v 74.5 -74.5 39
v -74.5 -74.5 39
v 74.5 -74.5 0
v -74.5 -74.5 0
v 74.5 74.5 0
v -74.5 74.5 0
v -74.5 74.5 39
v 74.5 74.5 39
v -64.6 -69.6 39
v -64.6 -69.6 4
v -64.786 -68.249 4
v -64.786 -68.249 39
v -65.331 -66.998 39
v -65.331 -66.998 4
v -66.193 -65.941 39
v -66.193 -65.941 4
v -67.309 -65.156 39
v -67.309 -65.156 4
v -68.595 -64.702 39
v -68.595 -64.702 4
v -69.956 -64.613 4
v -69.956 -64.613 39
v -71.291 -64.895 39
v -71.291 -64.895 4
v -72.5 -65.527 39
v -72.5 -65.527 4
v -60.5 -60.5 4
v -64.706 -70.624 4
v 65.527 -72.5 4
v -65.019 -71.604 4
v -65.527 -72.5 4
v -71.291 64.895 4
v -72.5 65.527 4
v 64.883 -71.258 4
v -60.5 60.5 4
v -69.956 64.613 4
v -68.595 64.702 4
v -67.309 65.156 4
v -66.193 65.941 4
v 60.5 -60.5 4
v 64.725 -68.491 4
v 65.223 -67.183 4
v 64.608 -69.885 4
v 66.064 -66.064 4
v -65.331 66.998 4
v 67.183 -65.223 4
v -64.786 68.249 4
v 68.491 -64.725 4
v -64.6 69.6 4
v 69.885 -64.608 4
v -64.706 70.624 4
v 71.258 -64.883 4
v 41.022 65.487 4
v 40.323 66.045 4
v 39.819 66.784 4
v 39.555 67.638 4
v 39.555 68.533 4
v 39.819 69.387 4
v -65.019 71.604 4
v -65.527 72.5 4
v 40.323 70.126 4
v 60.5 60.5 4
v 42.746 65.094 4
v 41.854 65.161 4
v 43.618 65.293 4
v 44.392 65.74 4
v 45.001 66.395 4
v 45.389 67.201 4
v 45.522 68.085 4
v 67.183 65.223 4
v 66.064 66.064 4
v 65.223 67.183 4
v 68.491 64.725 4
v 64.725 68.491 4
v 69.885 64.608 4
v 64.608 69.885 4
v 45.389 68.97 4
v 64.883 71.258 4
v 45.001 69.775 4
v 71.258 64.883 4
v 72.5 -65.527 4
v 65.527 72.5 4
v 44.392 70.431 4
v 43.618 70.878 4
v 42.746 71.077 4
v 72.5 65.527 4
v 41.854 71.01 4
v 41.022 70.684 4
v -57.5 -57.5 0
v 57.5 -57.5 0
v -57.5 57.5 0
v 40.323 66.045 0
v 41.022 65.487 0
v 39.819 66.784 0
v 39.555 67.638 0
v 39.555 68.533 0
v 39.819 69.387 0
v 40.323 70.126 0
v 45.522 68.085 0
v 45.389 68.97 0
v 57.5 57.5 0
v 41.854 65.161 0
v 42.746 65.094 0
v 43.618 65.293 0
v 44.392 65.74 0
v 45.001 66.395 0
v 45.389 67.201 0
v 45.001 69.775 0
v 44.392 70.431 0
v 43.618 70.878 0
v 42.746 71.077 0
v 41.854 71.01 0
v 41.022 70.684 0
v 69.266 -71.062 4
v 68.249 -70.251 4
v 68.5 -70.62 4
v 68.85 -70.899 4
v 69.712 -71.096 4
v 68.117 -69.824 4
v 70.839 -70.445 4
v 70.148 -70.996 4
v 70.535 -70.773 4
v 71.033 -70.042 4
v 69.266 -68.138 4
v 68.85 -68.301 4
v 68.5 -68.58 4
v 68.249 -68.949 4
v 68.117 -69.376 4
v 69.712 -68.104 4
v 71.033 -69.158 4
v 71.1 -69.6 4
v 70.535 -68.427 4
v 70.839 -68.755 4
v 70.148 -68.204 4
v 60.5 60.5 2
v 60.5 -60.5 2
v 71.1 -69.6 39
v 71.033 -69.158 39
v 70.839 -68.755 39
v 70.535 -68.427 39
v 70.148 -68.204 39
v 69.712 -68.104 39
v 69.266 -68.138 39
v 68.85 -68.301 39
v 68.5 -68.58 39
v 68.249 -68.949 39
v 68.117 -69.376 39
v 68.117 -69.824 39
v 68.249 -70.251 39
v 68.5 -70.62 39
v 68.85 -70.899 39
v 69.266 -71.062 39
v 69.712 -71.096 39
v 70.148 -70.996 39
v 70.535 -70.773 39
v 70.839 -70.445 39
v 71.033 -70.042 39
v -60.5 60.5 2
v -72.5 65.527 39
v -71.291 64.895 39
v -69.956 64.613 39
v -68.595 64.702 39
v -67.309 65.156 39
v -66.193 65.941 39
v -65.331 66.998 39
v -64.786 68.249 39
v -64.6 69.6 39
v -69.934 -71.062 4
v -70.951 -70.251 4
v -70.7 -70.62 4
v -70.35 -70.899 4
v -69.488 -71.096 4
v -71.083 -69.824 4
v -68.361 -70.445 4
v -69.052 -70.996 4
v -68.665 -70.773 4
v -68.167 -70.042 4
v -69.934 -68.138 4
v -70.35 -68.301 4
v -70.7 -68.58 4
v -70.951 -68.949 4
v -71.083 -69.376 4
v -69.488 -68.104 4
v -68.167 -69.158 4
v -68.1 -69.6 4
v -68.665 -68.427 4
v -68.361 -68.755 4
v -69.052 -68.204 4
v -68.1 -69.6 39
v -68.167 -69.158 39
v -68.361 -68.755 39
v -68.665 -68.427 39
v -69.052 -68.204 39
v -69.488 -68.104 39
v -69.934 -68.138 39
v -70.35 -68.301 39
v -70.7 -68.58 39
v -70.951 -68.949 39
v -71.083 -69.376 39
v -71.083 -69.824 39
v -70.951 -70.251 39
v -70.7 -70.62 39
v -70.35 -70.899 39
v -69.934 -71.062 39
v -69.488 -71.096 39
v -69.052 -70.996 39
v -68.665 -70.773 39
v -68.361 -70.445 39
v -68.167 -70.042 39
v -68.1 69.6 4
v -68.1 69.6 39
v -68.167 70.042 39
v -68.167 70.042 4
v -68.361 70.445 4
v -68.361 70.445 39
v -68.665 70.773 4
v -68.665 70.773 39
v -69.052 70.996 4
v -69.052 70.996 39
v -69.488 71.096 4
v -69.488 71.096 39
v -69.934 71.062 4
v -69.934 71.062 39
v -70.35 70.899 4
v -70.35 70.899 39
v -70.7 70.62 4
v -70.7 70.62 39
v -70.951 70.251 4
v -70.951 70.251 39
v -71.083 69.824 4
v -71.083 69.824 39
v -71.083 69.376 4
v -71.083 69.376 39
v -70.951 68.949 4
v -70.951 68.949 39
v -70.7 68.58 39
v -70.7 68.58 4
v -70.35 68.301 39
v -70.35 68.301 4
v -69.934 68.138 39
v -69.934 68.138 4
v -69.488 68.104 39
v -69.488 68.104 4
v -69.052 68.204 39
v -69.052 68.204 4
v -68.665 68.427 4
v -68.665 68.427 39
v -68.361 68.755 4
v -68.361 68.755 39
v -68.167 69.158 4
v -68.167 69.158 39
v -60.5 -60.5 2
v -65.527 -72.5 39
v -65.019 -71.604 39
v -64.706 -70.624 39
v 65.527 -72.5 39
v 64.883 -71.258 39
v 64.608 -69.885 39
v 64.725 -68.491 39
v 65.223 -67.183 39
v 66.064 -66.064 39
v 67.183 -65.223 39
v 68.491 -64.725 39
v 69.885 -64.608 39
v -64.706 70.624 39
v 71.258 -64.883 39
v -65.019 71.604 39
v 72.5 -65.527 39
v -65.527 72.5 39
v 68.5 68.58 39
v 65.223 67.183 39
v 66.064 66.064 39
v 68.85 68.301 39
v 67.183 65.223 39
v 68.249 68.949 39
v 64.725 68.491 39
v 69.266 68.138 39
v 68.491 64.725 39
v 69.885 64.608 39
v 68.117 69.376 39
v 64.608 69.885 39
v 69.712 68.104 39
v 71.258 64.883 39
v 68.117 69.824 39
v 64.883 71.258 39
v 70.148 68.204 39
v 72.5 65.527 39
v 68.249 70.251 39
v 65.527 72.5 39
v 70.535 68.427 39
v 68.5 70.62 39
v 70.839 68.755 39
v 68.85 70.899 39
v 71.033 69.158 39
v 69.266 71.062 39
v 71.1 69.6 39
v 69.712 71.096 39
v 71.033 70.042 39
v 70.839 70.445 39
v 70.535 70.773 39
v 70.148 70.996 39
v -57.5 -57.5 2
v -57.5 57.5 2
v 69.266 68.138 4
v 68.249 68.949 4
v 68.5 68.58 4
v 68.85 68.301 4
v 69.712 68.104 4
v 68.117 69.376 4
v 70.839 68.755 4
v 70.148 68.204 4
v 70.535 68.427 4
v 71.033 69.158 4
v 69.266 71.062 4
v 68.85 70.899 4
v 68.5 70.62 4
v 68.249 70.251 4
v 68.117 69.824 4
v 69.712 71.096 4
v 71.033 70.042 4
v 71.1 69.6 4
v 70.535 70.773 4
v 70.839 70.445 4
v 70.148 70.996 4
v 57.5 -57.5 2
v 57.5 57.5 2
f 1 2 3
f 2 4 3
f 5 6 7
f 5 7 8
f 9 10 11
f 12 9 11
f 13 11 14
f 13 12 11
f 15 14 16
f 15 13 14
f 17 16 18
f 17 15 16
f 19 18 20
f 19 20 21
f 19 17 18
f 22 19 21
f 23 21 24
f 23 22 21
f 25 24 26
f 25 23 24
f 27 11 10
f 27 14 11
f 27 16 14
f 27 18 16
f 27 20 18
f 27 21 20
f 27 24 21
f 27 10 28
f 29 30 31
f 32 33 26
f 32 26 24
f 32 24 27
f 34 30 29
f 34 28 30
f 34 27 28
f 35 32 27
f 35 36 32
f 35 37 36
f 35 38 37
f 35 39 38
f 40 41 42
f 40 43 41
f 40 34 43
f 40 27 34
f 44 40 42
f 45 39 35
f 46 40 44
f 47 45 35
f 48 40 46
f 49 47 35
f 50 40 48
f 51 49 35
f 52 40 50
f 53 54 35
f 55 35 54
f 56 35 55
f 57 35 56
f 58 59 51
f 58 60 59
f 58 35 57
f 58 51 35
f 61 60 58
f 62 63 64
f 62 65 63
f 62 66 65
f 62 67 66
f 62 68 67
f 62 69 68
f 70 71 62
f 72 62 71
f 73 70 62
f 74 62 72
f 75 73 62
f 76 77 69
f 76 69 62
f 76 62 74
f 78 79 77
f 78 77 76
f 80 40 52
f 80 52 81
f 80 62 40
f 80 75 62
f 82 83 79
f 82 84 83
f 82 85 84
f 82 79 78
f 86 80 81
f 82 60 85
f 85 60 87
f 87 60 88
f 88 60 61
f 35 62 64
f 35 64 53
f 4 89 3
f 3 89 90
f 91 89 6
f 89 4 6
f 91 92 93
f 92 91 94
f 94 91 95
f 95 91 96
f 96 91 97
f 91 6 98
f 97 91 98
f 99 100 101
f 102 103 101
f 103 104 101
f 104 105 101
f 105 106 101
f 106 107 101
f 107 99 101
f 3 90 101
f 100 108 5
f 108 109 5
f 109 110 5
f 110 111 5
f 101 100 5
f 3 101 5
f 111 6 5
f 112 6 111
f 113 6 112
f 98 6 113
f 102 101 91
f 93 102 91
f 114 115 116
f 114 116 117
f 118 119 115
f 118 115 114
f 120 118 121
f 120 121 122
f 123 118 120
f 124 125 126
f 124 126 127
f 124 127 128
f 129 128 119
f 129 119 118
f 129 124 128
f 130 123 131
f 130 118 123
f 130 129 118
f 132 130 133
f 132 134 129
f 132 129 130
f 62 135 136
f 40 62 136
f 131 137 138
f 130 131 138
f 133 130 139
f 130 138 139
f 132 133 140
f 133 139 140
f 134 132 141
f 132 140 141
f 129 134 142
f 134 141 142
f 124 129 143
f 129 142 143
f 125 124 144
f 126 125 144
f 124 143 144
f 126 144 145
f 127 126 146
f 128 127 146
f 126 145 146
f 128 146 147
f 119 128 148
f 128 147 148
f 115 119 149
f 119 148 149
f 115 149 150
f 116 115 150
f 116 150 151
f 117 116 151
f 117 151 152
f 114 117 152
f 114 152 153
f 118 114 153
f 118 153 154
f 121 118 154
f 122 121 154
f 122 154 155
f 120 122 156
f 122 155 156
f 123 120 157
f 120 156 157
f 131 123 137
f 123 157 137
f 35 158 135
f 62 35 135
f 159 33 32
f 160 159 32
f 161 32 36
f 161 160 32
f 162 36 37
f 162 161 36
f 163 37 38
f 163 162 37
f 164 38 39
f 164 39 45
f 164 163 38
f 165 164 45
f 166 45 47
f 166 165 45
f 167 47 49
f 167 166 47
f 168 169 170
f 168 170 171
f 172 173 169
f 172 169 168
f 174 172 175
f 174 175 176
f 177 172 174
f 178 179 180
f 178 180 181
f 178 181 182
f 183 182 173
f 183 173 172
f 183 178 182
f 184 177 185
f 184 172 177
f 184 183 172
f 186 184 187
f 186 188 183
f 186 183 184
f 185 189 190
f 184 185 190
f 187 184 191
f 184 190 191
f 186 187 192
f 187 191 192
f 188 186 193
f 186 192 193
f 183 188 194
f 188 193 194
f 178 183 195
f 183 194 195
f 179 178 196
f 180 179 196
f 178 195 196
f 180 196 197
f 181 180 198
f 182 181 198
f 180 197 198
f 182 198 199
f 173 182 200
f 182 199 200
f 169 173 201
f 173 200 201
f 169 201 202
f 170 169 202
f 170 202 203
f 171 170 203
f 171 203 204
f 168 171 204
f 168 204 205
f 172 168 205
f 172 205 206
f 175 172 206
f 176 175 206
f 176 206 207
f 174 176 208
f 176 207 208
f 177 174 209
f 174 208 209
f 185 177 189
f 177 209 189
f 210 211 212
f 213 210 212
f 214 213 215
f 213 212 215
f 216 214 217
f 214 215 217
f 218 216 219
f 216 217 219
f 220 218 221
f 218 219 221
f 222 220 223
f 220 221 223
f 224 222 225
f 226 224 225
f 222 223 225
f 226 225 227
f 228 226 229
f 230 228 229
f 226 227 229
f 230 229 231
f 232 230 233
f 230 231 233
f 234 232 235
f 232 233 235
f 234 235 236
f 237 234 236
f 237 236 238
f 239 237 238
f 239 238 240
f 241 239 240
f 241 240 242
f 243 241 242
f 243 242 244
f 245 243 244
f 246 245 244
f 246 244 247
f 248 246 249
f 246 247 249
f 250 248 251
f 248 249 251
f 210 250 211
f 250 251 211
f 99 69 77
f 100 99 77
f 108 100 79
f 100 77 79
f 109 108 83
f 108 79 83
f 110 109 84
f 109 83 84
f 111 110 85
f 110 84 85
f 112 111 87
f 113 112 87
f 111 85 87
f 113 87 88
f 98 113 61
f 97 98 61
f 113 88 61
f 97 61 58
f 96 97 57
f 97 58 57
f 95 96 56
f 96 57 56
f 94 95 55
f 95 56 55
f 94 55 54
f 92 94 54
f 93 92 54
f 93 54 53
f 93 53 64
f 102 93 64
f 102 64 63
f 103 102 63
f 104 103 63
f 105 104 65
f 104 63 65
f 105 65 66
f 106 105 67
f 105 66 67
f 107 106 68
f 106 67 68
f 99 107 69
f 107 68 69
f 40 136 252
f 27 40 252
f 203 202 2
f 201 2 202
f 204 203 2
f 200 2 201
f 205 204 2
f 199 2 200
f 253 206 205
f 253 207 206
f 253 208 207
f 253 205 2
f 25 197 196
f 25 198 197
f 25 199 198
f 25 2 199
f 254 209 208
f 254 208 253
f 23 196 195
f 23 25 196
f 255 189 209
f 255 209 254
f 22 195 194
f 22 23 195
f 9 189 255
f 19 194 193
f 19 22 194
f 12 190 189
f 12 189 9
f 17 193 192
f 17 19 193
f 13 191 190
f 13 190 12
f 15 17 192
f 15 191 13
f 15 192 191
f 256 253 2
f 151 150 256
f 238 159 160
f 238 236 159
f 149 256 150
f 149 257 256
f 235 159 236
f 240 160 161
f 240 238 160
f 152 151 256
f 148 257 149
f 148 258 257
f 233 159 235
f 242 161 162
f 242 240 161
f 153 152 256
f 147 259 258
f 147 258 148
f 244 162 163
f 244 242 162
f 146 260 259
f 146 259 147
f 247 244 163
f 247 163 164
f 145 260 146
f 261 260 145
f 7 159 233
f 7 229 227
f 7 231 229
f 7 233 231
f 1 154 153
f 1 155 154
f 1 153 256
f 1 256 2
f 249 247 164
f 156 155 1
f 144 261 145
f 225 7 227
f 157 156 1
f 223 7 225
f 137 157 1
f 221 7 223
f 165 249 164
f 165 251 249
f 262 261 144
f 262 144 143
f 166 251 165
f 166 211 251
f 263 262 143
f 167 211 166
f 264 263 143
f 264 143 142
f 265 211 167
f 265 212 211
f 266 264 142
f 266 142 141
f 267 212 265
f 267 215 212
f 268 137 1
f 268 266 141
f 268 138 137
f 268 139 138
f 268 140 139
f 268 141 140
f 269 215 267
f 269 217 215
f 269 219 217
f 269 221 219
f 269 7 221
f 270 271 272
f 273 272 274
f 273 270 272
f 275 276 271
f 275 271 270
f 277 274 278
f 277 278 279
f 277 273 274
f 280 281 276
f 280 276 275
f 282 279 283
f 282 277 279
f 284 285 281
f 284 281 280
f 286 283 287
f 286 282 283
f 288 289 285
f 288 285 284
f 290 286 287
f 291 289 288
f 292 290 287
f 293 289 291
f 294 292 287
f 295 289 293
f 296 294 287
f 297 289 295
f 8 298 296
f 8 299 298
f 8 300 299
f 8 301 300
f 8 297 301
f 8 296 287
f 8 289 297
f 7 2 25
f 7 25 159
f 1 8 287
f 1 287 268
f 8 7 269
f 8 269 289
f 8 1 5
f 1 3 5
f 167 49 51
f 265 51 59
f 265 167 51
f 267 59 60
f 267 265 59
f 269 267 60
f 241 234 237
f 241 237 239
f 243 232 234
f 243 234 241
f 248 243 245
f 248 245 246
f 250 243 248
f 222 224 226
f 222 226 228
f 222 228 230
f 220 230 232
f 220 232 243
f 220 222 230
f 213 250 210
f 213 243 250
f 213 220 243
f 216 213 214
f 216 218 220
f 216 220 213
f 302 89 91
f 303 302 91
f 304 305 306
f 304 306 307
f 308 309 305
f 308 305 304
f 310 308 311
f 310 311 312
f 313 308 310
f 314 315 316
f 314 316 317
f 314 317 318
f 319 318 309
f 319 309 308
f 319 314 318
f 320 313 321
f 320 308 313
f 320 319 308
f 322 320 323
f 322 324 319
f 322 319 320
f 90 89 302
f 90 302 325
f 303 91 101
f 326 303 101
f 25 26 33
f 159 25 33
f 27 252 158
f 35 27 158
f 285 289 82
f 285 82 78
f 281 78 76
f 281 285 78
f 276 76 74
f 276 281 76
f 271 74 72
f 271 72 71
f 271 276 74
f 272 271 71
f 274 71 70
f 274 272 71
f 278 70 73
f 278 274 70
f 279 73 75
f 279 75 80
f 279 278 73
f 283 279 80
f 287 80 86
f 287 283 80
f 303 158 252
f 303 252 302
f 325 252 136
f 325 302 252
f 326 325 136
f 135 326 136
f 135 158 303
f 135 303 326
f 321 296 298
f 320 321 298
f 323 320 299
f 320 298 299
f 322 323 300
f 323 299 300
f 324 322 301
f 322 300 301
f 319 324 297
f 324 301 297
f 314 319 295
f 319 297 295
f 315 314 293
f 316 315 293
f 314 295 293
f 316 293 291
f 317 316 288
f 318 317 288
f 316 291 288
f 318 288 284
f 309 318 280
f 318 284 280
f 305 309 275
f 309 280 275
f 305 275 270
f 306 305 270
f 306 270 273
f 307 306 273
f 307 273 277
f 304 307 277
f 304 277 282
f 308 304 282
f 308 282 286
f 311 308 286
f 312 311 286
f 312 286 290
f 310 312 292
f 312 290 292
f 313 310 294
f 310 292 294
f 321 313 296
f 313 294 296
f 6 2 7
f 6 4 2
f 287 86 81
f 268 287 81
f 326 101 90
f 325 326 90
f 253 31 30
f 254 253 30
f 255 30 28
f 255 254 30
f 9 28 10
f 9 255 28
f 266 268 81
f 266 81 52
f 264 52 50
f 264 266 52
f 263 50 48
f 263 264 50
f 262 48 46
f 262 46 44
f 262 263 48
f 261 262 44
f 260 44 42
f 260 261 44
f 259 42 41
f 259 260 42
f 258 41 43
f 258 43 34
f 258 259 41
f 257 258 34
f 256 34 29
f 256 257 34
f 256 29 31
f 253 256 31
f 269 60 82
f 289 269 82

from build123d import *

# Parameters (mm, degrees)
F1_DEPTH = 4
F0_W     = 115
F0_H     = 3
F0_W_2   = 3
F0_H_2   = 115
F2_DEPTH = 2
F3_R     = 3
F4_DEPTH = 4
F5_W     = 149
F5_H     = 149
F6_DEPTH = 35
F7_R     = 1.5
F8_DEPTH = 35


with BuildPart() as f1:
    # F0 (on Top) → F1 (new body)
    with BuildSketch(Plane.XY):
        Polygon((74.5, 74.5), (60.5, 74.5), (-60.5, 74.5), (-74.5, 74.5), (-74.5, 60.5), (-74.5, -60.5), (-74.5, -74.5), (-60.5, -74.5), (60.5, -74.5), (74.5, -74.5), (74.5, -60.5), (74.5, 60.5), align=None)
        Polygon((57.5, 60.5), (60.5, 60.5), (60.5, 57.5), (60.5, -57.5), (60.5, -60.5), (57.5, -60.5), (-57.5, -60.5), (-60.5, -60.5), (-60.5, -57.5), (-60.5, 57.5), (-60.5, 60.5), (-57.5, 60.5), align=None, mode=Mode.SUBTRACT)
    extrude(amount=F1_DEPTH)

    # F0 (on Top) → F2 (join)
    with BuildSketch(Plane.XY):
        with Locations((0, 59)):
            Rectangle(F0_W, F0_H)
        with Locations((59, 59)):
            Rectangle(F0_W_2, F0_H)
        with Locations((59, 0)):
            Rectangle(F0_W_2, F0_H_2)
        with Locations((59, -59)):
            Rectangle(F0_W_2, F0_H)
        with Locations((0, -59)):
            Rectangle(F0_W, F0_H)
        with Locations((-59, 0)):
            Rectangle(F0_W_2, F0_H_2)
        with Locations((-59, -59)):
            Rectangle(F0_W_2, F0_H)
        with Locations((-59, 59)):
            Rectangle(F0_W_2, F0_H)
    extrude(amount=F2_DEPTH)

    # F3 (on face) → F4 (cut, through all)
    with BuildSketch(Plane.XY.offset(4)):
        with Locations((42.5219088793, 68.0854469538)):
            Circle(F3_R)
    extrude(amount=-F4_DEPTH, mode=Mode.SUBTRACT)

    # F5 (on face) → F6 (join)
    with BuildSketch(Plane.XY.offset(4)):
        Rectangle(F5_W, F5_H)
        Polygon((-60.5, 72.5), (60.5, 72.5), (72.5, 72.5), (72.5, 60.5), (72.5, -60.5), (72.5, -72.5), (60.5, -72.5), (-60.5, -72.5), (-72.5, -72.5), (-72.5, -60.5), (-72.5, 60.5), (-72.5, 72.5), align=None, mode=Mode.SUBTRACT)
    extrude(amount=F6_DEPTH)

    # F7 (on face) → F8 (join)
    with BuildSketch(Plane.XY.offset(39)):
        with BuildLine():
            ThreePointArc((-72.5, 65.5269179106), (-67.3087125968, 65.1559040438), (-64.6000009775, 69.6000009775))
            ThreePointArc((-64.6000009775, 69.6000009775), (-64.8373643478, 71.1222665039), (-65.5269179106, 72.5))
            Line((-65.5269179106, 72.5), (-72.5, 72.5))
            Line((-72.5, 72.5), (-72.5, 65.5269179106))
        make_face()
        with Locations((-69.6000009775, 69.6000009775)):
            Circle(F7_R, mode=Mode.SUBTRACT)
        with BuildLine():
            Line((72.5, 72.5), (65.5269179106, 72.5))
            ThreePointArc((65.5269179106, 72.5), (66.0644670716, 66.0644670716), (72.5, 65.5269179106))
            Line((72.5, 65.5269179106), (72.5, 72.5))
        make_face()
        with Locations((69.6000009775, 69.6000009775)):
            Circle(F7_R, mode=Mode.SUBTRACT)
        with BuildLine():
            Line((72.5, -72.5), (72.5, -65.5269179106))
            ThreePointArc((72.5, -65.5269179106), (66.0644670716, -66.0644670716), (65.5269179106, -72.5))
            Line((65.5269179106, -72.5), (72.5, -72.5))
        make_face()
        with Locations((69.6000009775, -69.6000009775)):
            Circle(F7_R, mode=Mode.SUBTRACT)
        with BuildLine():
            ThreePointArc((-64.6000009775, -69.6000009775), (-67.3087125968, -65.1559040438), (-72.5, -65.5269179106))
            Line((-72.5, -65.5269179106), (-72.5, -72.5))
            Line((-72.5, -72.5), (-65.5269179106, -72.5))
            ThreePointArc((-65.5269179106, -72.5), (-64.8373643478, -71.1222665039), (-64.6000009775, -69.6000009775))
        make_face()
        with Locations((-69.6000009775, -69.6000009775)):
            Circle(F7_R, mode=Mode.SUBTRACT)
    extrude(amount=-F8_DEPTH)


solid = f1.part
